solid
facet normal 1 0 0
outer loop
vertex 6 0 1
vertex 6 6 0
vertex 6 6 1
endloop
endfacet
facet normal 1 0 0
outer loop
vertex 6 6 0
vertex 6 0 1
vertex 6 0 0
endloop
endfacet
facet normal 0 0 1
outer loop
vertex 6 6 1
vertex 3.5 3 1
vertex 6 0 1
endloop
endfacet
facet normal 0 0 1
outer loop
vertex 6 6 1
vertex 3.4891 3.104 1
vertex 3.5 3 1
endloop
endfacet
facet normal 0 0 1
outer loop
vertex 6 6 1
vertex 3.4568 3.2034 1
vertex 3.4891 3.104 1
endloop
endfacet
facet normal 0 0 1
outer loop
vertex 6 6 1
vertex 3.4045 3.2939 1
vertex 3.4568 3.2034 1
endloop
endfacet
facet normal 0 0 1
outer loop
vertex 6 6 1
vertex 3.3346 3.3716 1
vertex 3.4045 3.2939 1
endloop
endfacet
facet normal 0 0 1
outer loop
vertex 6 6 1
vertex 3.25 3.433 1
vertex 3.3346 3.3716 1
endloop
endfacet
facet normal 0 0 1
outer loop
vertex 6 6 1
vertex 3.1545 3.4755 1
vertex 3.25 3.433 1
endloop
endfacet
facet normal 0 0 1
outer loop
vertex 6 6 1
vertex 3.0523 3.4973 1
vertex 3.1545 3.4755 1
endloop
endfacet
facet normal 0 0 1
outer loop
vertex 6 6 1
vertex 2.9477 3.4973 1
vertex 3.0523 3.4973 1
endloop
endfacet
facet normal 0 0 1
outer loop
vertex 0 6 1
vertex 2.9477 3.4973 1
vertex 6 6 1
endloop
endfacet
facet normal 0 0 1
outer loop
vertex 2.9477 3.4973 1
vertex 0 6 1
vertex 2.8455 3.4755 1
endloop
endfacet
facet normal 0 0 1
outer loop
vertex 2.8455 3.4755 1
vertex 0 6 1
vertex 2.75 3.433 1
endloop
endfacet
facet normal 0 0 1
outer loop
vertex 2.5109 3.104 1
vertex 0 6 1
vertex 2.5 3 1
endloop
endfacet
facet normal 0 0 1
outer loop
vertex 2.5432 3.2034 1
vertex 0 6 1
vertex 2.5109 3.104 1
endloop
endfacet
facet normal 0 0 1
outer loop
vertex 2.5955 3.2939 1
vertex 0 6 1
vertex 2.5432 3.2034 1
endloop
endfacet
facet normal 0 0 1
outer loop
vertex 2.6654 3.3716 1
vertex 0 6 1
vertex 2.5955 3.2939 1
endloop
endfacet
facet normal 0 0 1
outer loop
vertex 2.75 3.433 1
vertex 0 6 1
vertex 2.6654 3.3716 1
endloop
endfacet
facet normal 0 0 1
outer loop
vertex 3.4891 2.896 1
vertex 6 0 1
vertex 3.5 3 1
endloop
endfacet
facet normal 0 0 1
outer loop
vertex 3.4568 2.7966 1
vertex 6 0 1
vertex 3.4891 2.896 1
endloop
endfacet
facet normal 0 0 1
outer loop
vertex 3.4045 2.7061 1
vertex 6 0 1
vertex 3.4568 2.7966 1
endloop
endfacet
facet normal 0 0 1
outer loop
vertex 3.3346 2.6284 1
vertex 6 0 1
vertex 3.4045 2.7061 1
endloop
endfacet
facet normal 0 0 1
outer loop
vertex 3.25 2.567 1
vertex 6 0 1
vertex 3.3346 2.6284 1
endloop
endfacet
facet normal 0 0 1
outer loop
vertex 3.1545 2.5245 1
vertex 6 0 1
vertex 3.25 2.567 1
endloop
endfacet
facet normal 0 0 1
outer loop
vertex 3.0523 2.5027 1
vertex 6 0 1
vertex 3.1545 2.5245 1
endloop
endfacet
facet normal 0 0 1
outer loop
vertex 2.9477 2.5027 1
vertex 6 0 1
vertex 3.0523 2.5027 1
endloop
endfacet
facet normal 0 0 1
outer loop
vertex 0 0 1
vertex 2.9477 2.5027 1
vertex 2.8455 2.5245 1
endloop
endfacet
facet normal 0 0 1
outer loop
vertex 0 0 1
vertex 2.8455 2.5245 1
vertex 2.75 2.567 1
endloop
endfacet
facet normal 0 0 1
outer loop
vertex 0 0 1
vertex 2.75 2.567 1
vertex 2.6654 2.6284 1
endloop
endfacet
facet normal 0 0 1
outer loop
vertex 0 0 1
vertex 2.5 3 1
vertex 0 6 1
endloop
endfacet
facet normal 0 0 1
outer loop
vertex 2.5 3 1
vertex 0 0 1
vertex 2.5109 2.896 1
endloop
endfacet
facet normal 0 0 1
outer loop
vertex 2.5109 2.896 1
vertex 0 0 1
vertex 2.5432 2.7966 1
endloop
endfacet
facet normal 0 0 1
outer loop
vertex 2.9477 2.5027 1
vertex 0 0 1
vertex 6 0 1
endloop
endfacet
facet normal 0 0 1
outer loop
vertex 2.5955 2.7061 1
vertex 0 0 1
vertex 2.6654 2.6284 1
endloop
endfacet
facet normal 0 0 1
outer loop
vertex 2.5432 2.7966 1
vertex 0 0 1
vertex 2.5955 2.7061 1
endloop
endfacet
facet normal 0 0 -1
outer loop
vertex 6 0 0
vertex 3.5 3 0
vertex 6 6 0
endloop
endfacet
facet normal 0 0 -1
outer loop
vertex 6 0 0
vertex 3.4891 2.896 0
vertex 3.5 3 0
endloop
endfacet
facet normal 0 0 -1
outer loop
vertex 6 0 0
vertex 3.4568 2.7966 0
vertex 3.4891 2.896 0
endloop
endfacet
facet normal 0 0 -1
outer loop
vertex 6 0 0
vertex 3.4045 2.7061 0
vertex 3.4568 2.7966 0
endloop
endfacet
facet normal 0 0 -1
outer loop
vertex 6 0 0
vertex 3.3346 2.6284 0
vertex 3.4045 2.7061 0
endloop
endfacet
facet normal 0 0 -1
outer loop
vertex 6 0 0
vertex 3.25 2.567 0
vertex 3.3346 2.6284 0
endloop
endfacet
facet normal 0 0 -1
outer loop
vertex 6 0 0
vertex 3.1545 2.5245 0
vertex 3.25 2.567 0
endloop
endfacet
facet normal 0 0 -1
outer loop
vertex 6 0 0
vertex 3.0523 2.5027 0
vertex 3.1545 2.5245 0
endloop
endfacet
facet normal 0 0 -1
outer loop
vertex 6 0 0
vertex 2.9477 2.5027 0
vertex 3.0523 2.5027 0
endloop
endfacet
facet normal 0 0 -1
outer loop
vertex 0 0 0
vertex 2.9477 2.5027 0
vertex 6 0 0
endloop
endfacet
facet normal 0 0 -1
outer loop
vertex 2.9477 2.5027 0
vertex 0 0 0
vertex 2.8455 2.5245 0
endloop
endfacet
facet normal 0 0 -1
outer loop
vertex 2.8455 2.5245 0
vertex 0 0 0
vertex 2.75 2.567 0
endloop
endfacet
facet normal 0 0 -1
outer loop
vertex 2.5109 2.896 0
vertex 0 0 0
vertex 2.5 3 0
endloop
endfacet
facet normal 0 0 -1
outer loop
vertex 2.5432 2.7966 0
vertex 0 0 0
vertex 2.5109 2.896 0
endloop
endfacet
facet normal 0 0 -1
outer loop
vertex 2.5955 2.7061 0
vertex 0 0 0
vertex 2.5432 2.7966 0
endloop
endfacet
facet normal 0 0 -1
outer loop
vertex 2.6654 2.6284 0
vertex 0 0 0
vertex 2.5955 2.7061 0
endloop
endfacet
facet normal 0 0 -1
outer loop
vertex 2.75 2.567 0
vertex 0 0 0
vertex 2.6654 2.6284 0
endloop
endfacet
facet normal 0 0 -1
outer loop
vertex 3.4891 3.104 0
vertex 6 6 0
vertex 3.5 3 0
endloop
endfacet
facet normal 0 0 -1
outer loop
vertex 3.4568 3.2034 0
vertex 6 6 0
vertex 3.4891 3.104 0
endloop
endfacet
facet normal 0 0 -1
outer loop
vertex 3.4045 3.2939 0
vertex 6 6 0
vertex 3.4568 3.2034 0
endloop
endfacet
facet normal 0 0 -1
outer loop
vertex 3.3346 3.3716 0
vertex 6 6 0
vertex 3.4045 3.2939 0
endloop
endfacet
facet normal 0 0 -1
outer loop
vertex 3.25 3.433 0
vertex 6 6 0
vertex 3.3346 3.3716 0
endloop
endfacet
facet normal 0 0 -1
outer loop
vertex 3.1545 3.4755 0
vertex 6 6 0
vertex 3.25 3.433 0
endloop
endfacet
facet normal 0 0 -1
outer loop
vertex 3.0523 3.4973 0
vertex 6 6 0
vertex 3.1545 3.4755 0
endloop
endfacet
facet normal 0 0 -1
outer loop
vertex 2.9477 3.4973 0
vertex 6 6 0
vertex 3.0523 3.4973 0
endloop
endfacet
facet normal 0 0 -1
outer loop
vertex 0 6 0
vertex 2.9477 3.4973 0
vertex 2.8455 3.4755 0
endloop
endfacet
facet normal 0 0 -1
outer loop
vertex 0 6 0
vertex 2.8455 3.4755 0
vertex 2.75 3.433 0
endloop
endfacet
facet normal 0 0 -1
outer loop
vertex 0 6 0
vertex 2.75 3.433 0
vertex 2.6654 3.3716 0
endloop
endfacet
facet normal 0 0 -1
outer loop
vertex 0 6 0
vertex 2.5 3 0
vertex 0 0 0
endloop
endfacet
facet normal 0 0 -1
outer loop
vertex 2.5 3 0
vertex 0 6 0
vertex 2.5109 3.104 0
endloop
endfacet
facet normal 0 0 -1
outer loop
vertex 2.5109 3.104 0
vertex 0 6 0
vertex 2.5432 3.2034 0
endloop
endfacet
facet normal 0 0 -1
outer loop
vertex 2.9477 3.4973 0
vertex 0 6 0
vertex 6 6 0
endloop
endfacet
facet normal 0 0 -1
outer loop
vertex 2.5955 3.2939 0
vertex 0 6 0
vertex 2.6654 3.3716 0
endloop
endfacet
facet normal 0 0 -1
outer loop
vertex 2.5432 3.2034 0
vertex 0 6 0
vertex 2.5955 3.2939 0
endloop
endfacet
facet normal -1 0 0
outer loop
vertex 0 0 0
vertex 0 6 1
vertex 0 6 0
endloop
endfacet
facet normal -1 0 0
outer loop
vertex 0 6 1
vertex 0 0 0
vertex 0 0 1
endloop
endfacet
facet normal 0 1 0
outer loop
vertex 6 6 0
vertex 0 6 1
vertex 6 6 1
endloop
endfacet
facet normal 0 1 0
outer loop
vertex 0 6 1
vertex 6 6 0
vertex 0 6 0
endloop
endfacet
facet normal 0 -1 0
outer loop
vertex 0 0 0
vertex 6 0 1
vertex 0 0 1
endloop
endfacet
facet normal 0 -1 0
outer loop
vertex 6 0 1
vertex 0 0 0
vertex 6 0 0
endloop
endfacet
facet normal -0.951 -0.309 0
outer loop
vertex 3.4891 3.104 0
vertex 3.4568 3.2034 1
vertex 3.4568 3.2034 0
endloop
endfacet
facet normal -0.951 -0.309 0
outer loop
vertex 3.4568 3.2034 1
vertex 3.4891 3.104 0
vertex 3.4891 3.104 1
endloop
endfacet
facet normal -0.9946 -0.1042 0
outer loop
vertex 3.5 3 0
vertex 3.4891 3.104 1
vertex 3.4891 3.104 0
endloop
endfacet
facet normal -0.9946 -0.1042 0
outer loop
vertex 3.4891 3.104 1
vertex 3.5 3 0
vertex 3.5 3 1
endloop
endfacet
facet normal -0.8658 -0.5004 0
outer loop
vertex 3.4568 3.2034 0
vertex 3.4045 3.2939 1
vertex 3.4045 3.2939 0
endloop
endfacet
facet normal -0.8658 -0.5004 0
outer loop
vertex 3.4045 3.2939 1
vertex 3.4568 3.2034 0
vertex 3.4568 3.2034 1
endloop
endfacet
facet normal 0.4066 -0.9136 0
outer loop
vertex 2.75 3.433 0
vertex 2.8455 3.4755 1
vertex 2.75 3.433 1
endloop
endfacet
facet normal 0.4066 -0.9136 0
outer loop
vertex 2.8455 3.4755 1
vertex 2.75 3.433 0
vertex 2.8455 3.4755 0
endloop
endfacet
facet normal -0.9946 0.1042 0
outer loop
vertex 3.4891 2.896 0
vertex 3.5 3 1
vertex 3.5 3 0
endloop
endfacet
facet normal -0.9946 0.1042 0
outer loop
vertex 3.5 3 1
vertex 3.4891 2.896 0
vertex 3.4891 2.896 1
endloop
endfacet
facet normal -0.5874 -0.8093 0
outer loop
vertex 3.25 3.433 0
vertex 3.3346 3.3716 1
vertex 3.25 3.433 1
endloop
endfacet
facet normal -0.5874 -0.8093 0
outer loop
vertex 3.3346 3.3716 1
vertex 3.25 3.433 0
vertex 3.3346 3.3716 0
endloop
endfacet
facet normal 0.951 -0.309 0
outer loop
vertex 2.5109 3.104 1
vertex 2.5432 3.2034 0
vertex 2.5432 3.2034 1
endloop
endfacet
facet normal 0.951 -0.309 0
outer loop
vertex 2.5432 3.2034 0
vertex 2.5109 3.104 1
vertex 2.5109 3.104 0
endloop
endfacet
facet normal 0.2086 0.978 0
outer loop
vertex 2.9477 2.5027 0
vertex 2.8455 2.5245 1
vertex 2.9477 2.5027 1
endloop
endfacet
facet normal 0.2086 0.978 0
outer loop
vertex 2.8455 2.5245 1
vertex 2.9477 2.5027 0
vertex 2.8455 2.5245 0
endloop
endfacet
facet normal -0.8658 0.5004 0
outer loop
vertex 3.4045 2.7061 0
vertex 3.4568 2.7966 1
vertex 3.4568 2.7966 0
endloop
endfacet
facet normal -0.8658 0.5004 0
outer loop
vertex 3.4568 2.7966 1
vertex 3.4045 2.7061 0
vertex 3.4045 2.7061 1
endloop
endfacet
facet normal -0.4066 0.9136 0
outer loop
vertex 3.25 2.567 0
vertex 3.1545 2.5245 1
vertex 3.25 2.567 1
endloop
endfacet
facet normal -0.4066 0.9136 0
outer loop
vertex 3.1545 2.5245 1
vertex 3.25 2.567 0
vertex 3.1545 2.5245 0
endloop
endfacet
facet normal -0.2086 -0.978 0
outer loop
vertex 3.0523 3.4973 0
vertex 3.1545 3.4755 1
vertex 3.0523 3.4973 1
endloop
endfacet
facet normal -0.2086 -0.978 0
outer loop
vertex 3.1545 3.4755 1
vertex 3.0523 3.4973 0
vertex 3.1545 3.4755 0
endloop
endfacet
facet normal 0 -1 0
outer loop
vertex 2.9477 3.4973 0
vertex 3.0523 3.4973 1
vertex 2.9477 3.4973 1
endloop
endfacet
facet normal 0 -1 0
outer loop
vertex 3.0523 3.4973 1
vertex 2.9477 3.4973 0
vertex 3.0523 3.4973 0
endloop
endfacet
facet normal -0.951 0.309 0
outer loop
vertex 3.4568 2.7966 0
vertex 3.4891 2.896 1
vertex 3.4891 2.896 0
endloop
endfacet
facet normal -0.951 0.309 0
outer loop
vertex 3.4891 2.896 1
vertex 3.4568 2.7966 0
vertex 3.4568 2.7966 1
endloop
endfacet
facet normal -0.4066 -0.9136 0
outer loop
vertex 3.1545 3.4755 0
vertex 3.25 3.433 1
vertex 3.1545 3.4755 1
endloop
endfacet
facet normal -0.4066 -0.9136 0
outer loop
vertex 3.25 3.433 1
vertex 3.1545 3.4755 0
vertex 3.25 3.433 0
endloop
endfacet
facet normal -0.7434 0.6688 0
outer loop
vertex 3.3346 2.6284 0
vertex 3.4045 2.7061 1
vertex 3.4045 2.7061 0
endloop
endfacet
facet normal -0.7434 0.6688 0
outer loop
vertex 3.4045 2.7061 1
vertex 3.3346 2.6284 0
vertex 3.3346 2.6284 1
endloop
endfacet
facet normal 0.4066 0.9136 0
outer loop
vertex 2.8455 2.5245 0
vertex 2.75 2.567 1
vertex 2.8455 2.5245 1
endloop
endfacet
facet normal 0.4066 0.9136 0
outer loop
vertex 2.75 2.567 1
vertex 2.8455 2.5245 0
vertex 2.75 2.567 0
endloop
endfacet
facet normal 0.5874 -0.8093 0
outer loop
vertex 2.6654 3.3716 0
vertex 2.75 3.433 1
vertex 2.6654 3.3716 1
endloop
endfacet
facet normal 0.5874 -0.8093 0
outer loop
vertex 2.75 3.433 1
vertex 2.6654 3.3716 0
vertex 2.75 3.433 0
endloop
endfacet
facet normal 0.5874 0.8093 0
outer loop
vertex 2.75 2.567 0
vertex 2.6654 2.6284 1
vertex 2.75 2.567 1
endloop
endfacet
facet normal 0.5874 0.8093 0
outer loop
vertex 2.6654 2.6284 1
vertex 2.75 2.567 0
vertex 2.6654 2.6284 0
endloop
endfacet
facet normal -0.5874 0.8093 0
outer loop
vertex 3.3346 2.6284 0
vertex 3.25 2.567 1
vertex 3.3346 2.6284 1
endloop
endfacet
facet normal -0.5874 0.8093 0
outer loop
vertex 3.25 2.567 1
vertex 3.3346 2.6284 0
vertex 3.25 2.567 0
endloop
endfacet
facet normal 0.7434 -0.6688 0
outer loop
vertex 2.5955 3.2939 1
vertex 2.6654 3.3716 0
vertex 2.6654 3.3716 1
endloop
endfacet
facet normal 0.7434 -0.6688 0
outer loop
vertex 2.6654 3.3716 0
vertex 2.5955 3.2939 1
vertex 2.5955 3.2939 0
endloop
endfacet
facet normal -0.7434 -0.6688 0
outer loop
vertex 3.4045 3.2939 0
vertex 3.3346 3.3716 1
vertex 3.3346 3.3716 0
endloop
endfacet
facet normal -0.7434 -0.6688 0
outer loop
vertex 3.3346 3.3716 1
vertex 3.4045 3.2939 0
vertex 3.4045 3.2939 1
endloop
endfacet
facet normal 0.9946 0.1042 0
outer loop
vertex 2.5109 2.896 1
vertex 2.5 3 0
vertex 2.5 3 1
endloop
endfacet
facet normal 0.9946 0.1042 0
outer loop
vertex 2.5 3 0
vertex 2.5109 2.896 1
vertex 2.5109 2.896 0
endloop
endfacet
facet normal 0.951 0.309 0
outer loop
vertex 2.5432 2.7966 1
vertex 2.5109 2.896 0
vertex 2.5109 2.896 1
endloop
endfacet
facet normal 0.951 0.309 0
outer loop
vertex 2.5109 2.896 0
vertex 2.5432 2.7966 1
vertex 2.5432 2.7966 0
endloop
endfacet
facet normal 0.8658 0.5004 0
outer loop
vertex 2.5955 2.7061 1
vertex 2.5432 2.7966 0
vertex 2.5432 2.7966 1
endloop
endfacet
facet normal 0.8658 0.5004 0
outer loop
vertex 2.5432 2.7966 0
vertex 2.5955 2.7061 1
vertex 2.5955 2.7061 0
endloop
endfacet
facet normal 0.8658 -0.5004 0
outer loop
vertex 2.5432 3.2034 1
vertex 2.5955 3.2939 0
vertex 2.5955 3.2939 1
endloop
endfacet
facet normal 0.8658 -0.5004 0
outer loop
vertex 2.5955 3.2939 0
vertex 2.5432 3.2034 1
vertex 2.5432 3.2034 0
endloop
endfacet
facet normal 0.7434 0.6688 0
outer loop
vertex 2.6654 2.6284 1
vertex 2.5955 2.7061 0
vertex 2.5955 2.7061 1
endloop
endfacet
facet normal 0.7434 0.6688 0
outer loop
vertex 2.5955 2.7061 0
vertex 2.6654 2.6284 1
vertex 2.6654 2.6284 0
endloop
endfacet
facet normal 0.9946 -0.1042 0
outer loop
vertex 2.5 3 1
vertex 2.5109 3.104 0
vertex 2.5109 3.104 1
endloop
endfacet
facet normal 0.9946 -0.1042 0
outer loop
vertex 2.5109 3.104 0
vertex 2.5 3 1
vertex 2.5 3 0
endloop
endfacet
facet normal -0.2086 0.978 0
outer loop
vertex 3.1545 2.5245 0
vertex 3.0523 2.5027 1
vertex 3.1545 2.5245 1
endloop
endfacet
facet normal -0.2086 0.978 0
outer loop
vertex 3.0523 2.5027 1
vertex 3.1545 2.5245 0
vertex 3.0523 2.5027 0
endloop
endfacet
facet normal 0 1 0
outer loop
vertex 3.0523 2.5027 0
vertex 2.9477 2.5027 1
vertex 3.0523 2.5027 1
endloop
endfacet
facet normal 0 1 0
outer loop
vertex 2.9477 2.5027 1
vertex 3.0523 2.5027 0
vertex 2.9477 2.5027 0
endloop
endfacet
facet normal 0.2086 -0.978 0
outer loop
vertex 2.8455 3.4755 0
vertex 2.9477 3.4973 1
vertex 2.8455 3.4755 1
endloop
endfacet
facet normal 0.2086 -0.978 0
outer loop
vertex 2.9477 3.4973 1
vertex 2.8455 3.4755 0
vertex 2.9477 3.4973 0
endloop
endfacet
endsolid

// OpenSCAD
//render(convexity = 2)

module plate(length, width, height){
	difference(){
		cube([length, width, height]);
		//cube([6,6,1]);
		translate([length/2,width/2,0]){
			cylinder(r = 0.5, h =1, $fn = 30);
		}
		//translate([3,3,0]){
			//cylinder(r = 0.5, h =1, $fn = 30);
		//}
	}
}
// rotation a = axes and v = voctor eg(x,y,z) axesies
//rotate(a = 90, v=[1,0,0]) translate([-3,-3,0]) plate();
plate(6,6,1);
